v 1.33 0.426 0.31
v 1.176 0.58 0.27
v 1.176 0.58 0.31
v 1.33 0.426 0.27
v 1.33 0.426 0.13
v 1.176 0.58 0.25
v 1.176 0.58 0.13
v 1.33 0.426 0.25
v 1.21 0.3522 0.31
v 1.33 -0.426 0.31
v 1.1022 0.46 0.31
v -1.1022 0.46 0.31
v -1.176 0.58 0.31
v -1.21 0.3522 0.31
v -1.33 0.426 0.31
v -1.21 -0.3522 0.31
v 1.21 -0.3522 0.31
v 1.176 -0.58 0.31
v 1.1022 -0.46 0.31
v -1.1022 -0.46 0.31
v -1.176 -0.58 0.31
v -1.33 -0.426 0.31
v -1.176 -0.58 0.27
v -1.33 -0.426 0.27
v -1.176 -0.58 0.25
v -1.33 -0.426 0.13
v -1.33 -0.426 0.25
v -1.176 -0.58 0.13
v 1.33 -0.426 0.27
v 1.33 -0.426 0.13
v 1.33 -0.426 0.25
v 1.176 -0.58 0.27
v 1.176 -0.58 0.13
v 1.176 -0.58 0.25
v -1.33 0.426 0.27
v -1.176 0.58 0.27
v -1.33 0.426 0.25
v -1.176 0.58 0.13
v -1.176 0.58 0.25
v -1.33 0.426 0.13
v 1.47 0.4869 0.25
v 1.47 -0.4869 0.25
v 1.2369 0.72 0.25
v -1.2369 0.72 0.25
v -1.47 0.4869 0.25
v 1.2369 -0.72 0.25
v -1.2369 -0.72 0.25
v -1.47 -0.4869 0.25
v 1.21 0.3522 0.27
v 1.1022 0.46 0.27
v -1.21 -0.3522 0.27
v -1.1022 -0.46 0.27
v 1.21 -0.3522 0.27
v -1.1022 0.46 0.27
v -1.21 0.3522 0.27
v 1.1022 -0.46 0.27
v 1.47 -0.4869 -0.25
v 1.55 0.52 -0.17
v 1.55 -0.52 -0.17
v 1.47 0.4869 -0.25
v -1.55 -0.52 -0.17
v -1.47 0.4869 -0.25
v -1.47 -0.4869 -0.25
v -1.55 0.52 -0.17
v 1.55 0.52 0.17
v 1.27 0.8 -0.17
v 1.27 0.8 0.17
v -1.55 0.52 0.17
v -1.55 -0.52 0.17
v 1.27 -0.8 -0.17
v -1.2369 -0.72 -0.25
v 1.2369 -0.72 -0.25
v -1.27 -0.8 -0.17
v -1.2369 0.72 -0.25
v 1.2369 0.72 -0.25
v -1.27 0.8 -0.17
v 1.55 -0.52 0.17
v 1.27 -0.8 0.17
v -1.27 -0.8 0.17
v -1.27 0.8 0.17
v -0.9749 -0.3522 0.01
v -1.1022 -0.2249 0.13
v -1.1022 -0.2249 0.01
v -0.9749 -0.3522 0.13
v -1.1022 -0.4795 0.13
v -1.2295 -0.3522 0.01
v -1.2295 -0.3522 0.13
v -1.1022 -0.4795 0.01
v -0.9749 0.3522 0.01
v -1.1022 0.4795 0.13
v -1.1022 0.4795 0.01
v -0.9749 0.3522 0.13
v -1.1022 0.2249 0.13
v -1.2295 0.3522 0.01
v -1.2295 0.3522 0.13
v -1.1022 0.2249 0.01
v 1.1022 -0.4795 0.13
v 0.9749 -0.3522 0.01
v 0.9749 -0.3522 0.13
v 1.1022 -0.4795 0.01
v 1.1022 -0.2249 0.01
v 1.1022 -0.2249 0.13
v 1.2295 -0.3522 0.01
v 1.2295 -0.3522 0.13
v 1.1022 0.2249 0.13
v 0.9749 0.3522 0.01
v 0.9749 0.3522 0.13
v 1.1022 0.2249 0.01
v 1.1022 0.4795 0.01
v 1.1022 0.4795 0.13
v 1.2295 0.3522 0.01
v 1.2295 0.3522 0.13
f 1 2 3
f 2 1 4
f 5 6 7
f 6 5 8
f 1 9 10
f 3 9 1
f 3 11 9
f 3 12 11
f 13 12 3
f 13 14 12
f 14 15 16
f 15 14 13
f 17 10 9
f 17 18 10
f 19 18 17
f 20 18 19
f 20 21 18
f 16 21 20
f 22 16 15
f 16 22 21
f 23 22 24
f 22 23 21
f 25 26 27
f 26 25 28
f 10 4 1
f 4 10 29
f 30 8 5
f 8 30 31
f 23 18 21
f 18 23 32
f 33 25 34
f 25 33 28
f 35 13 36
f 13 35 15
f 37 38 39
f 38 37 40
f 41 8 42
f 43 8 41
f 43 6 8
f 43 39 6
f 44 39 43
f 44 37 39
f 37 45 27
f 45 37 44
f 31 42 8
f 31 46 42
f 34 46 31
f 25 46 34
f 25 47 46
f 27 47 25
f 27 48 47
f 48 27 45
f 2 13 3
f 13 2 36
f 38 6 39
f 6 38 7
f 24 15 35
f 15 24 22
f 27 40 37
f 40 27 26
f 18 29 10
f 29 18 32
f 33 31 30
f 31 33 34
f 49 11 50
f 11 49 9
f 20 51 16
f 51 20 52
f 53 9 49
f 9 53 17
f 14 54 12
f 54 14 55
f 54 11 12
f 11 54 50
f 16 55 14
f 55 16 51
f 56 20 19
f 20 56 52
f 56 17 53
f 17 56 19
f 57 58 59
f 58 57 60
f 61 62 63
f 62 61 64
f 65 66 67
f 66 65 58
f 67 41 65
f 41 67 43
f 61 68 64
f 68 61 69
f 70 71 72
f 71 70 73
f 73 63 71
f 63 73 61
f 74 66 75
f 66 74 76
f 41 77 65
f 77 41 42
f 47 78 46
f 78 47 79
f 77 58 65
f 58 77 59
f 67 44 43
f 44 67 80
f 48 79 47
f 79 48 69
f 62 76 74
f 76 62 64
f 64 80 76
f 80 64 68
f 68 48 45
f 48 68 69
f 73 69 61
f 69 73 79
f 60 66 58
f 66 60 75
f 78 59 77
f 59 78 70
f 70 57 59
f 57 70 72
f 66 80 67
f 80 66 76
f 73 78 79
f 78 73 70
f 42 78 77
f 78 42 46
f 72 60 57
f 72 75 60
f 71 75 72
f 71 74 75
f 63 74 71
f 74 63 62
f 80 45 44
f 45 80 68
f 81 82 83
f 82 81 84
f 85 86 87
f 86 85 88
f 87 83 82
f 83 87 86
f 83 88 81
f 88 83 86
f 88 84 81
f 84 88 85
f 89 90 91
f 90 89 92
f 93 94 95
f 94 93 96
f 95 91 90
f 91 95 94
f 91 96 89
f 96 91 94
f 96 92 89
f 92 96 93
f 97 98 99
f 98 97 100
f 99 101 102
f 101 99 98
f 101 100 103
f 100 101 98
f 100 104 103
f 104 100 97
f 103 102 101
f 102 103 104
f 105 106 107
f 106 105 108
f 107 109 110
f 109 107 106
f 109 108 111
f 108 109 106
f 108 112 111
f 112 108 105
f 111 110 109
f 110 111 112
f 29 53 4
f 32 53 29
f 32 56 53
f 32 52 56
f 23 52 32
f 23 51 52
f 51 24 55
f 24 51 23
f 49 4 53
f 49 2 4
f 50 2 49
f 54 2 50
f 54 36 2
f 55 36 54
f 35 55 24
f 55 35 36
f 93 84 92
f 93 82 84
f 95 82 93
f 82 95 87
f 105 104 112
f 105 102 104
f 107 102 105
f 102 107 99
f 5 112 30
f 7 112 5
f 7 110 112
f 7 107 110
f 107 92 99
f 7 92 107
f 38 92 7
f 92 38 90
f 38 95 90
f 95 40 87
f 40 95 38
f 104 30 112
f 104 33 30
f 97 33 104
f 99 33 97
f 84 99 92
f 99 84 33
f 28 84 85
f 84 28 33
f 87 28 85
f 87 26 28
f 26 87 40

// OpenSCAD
$fn=96;

L=3.1;
W=1.6;
H=0.5;

corner_clip=0.28;      // plan corner bevel
edge_chamfer=0.08;     // outer edge chamfer (top/bottom)
panel_margin=0.22;     // inset from outer perimeter to panel opening
panel_depth=0.12;      // recess depth from top
border_width=0.12;     // raised border width around recessed panel
border_height=0.06;    // border rise above top face
panel_corner_clip=0.18;// angled corner cuts inside panel

module oct2d(l,w,c){
    polygon(points=[
        [ l/2-c,  w/2],
        [ l/2,    w/2-c],
        [ l/2,   -w/2+c],
        [ l/2-c, -w/2],
        [-l/2+c, -w/2],
        [-l/2,   -w/2+c],
        [-l/2,    w/2-c],
        [-l/2+c,  w/2]
    ]);
}

module plate_body(){
    // main body with chamfered top/bottom edges via hull of two extrusions
    hull(){
        translate([0,0,-H/2+edge_chamfer])
            linear_extrude(height=H-2*edge_chamfer)
                oct2d(L,W,corner_clip);
        translate([0,0,-H/2])
            linear_extrude(height=0.001)
                offset(delta=-edge_chamfer)
                    oct2d(L,W,corner_clip);
        translate([0,0,H/2-0.001])
            linear_extrude(height=0.001)
                offset(delta=-edge_chamfer)
                    oct2d(L,W,corner_clip);
    }
}

module recessed_panel_cut(){
    l2 = L - 2*panel_margin;
    w2 = W - 2*panel_margin;
    c2 = max(0.01, corner_clip*0.55);
    translate([0,0,H/2 - panel_depth])
        linear_extrude(height=panel_depth+0.02)
            oct2d(l2,w2,c2);
}

module border_ring(){
    l2 = L - 2*panel_margin;
    w2 = W - 2*panel_margin;
    c2 = max(0.01, corner_clip*0.55);

    l3 = l2 - 2*border_width;
    w3 = w2 - 2*border_width;
    c3 = max(0.01, c2*0.7);

    difference(){
        translate([0,0,H/2])
            linear_extrude(height=border_height)
                oct2d(l2,w2,c2);
        translate([0,0,H/2-0.01])
            linear_extrude(height=border_height+0.02)
                oct2d(l3,w3,c3);
    }
}

module panel_corner_cuts(){
    l2 = L - 2*panel_margin;
    w2 = W - 2*panel_margin;
    c2 = max(0.01, corner_clip*0.55);

    l3 = l2 - 2*border_width;
    w3 = w2 - 2*border_width;
    c3 = max(0.01, c2*0.7);

    // apply to inner panel area (inside border), cutting angled corners
    z0 = H/2 - panel_depth - 0.01;
    zh = panel_depth + border_height + 0.04;

    for (sx=[-1,1], sy=[-1,1]){
        translate([sx*(l3/2 - c3), sy*(w3/2 - c3), z0])
            rotate([0,0,45])
                cube([panel_corner_clip, panel_corner_clip, zh], center=true);
    }
}

difference(){
    union(){
        plate_body();
        border_ring();
    }
    recessed_panel_cut();
    panel_corner_cuts();
}
